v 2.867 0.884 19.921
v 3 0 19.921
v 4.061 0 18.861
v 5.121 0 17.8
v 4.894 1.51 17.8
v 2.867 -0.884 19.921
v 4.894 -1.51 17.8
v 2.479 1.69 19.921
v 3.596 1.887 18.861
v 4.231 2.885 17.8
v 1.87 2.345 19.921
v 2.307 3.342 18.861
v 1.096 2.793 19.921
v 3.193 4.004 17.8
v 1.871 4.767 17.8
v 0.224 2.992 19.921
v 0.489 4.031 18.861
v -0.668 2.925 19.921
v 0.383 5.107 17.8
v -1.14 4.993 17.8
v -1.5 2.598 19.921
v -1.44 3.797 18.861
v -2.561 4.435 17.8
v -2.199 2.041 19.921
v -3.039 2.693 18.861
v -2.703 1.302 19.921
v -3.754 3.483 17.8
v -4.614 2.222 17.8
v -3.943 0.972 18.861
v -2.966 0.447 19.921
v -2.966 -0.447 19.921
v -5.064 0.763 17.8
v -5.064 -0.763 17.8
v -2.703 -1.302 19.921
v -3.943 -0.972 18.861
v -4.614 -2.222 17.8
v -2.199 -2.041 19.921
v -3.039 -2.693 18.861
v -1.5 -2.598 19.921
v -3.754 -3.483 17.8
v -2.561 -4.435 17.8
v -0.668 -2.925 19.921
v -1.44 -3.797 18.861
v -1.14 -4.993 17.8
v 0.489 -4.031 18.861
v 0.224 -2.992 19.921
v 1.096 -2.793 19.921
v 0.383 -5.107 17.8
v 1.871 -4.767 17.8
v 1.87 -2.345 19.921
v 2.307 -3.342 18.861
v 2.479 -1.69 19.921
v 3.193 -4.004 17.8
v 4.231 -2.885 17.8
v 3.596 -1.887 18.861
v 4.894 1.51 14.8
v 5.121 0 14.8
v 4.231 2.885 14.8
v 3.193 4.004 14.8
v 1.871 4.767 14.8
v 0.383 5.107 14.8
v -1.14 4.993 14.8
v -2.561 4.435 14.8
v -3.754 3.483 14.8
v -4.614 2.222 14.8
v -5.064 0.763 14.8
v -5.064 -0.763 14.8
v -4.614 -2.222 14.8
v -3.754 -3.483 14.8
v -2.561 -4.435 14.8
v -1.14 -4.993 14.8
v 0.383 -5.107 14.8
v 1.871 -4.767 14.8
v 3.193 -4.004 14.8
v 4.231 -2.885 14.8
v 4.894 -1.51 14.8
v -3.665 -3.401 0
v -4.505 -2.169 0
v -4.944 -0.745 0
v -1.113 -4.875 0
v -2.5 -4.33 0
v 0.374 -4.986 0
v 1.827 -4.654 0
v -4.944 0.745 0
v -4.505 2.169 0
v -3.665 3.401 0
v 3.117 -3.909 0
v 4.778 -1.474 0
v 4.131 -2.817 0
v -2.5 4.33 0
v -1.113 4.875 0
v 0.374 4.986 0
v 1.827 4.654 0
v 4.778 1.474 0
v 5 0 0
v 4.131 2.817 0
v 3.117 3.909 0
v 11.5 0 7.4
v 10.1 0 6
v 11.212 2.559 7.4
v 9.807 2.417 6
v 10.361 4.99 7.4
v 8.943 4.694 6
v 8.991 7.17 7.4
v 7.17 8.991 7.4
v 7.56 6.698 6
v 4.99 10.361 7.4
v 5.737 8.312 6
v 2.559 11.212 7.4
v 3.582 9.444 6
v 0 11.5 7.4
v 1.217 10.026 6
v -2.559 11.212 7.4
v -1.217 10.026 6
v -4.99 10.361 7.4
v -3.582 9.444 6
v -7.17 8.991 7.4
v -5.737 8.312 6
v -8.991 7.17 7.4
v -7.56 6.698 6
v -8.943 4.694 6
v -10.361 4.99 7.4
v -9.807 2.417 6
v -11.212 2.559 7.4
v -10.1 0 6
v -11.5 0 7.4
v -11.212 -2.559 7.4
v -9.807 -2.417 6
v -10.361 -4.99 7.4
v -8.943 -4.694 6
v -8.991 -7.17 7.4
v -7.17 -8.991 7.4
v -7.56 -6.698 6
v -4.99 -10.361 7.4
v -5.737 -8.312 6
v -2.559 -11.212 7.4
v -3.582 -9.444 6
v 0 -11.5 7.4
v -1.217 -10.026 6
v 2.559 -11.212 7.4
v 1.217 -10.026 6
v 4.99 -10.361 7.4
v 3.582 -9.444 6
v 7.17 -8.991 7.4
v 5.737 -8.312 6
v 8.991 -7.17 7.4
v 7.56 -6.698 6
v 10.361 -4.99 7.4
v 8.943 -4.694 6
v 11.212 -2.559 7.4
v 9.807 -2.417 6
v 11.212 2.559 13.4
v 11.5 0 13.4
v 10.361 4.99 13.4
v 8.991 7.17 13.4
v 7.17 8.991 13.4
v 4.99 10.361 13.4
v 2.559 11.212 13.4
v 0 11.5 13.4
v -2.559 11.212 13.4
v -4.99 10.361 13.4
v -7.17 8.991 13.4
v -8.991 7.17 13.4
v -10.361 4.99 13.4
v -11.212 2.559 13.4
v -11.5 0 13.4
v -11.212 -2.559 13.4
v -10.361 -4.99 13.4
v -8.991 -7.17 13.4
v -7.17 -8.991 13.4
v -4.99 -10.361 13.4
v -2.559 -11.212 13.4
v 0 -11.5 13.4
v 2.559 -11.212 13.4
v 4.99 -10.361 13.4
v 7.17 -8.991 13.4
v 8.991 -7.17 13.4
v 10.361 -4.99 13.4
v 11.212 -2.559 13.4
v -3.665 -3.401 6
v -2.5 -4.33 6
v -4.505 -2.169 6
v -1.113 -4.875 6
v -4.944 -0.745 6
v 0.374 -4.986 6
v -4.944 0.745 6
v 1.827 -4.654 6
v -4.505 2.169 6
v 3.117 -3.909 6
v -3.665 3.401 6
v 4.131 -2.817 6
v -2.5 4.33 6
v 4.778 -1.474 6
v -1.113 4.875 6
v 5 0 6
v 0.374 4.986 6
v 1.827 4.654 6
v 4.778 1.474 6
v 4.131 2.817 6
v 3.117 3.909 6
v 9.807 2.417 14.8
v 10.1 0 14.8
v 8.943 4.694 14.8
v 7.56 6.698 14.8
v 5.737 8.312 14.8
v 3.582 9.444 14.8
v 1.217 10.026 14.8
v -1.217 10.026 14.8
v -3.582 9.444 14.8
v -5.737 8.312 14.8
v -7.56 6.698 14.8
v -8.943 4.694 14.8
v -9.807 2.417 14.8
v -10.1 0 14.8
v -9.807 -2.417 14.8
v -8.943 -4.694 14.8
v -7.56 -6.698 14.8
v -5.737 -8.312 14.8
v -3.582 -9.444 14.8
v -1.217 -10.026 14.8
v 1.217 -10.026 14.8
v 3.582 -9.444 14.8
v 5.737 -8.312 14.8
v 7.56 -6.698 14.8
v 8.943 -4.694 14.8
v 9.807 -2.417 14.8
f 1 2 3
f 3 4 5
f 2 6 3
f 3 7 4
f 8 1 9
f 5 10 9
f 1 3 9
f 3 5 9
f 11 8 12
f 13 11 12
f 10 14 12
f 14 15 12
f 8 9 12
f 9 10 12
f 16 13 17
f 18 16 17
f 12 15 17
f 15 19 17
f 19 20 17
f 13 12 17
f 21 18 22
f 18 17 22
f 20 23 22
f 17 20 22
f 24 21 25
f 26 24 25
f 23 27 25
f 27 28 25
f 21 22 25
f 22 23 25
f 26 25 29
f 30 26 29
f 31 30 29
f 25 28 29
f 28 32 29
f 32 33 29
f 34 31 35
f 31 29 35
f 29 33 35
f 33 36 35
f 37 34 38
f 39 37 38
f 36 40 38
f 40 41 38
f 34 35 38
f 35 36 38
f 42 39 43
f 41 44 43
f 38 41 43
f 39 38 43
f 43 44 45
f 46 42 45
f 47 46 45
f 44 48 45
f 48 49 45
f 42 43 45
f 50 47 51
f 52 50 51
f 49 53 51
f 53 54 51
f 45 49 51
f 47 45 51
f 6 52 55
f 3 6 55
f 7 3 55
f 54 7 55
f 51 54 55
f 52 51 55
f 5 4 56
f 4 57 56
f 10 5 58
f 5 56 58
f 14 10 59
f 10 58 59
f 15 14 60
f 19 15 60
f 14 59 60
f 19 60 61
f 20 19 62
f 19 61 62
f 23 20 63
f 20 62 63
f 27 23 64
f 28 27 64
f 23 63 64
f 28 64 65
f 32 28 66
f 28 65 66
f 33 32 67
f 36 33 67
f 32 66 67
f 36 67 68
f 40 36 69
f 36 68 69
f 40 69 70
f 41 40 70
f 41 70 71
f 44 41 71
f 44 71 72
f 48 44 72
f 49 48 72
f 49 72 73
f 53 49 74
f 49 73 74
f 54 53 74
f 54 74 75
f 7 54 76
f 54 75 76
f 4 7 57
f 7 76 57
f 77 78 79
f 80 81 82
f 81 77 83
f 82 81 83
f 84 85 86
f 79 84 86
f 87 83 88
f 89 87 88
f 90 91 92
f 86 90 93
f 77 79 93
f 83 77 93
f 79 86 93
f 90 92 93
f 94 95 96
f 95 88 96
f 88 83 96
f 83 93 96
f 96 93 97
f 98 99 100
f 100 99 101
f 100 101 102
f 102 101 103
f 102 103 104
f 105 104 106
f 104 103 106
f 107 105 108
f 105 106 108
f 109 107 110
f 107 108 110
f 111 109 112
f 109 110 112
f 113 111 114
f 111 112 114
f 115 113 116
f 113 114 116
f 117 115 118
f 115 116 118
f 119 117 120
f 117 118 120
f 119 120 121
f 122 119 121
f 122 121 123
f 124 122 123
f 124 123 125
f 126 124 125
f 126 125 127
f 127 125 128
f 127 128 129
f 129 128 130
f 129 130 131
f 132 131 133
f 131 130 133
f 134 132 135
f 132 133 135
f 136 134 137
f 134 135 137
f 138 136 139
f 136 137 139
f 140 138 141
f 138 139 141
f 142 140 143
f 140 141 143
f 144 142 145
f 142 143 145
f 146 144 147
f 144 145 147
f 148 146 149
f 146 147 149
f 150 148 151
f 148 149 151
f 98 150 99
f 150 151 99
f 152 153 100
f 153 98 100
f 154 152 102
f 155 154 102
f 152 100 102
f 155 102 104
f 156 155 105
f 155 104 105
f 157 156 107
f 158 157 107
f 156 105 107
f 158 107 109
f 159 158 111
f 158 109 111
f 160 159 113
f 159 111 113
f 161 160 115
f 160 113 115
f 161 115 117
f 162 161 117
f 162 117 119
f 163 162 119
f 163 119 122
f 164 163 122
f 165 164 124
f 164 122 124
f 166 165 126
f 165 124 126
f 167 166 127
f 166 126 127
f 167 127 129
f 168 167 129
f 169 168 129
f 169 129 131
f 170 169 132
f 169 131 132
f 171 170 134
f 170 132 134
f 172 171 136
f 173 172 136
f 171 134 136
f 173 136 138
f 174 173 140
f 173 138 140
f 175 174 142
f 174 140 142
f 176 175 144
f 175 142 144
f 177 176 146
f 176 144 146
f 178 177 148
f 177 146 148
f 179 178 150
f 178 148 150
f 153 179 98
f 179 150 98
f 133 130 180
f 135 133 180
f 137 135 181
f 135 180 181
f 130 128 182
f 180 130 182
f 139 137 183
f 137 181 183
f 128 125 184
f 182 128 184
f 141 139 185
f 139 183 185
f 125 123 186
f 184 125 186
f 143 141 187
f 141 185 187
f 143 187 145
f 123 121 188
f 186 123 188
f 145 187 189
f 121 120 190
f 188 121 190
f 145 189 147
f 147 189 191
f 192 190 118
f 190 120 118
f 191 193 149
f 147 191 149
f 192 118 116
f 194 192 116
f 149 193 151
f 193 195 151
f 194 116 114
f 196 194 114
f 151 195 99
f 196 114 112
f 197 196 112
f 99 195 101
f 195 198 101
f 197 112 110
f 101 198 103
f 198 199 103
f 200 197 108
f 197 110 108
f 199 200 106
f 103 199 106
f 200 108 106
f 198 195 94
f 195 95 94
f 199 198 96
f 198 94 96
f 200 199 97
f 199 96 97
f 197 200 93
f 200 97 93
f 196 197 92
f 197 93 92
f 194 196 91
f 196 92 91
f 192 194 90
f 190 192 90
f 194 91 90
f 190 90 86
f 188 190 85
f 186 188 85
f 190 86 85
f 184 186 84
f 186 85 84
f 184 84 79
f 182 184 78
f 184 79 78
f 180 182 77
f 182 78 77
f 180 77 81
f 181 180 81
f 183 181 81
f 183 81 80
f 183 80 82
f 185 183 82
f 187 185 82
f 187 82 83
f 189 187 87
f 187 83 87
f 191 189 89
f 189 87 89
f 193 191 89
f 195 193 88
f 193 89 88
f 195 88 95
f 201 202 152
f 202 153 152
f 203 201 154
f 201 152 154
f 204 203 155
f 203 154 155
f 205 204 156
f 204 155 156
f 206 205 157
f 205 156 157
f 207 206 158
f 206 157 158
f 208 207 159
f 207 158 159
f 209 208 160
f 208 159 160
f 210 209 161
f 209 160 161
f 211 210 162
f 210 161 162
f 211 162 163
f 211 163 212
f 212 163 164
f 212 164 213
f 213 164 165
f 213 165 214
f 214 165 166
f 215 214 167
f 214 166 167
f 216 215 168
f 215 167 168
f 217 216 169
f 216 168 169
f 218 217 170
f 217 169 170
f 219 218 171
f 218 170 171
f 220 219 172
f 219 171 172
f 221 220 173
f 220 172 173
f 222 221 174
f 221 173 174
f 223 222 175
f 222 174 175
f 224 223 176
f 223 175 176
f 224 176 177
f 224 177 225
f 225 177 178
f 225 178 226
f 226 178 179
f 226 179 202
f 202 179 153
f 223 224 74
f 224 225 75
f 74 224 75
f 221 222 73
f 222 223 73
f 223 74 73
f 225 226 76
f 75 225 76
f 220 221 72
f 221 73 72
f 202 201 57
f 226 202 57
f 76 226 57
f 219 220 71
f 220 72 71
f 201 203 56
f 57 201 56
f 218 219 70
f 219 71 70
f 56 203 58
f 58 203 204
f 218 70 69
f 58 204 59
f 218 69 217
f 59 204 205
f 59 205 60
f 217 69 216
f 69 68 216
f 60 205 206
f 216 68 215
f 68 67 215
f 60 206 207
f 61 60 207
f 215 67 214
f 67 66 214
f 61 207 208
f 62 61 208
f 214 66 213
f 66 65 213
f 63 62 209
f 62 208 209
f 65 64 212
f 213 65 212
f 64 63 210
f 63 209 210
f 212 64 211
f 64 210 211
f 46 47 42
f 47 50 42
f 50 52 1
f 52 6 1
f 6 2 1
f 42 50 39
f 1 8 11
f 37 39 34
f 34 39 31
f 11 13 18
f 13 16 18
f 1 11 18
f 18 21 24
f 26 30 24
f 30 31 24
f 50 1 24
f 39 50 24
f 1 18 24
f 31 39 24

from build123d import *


with BuildPart() as part:
    # Sketch → Revolution (revolve)
    with BuildSketch(Plane.XZ):
        Polygon((0, 19.92132), (3, 19.92132), (5.12132, 17.8), (5.12132, 14.8), (10.1, 14.8), (11.5, 13.4), (11.5, 7.4), (10.1, 6), (5, 6), (5, 0), (0, 0), align=None)
    revolve(axis=Axis((0, 0, 0), (0, 0, 1)))


solid = part.part
